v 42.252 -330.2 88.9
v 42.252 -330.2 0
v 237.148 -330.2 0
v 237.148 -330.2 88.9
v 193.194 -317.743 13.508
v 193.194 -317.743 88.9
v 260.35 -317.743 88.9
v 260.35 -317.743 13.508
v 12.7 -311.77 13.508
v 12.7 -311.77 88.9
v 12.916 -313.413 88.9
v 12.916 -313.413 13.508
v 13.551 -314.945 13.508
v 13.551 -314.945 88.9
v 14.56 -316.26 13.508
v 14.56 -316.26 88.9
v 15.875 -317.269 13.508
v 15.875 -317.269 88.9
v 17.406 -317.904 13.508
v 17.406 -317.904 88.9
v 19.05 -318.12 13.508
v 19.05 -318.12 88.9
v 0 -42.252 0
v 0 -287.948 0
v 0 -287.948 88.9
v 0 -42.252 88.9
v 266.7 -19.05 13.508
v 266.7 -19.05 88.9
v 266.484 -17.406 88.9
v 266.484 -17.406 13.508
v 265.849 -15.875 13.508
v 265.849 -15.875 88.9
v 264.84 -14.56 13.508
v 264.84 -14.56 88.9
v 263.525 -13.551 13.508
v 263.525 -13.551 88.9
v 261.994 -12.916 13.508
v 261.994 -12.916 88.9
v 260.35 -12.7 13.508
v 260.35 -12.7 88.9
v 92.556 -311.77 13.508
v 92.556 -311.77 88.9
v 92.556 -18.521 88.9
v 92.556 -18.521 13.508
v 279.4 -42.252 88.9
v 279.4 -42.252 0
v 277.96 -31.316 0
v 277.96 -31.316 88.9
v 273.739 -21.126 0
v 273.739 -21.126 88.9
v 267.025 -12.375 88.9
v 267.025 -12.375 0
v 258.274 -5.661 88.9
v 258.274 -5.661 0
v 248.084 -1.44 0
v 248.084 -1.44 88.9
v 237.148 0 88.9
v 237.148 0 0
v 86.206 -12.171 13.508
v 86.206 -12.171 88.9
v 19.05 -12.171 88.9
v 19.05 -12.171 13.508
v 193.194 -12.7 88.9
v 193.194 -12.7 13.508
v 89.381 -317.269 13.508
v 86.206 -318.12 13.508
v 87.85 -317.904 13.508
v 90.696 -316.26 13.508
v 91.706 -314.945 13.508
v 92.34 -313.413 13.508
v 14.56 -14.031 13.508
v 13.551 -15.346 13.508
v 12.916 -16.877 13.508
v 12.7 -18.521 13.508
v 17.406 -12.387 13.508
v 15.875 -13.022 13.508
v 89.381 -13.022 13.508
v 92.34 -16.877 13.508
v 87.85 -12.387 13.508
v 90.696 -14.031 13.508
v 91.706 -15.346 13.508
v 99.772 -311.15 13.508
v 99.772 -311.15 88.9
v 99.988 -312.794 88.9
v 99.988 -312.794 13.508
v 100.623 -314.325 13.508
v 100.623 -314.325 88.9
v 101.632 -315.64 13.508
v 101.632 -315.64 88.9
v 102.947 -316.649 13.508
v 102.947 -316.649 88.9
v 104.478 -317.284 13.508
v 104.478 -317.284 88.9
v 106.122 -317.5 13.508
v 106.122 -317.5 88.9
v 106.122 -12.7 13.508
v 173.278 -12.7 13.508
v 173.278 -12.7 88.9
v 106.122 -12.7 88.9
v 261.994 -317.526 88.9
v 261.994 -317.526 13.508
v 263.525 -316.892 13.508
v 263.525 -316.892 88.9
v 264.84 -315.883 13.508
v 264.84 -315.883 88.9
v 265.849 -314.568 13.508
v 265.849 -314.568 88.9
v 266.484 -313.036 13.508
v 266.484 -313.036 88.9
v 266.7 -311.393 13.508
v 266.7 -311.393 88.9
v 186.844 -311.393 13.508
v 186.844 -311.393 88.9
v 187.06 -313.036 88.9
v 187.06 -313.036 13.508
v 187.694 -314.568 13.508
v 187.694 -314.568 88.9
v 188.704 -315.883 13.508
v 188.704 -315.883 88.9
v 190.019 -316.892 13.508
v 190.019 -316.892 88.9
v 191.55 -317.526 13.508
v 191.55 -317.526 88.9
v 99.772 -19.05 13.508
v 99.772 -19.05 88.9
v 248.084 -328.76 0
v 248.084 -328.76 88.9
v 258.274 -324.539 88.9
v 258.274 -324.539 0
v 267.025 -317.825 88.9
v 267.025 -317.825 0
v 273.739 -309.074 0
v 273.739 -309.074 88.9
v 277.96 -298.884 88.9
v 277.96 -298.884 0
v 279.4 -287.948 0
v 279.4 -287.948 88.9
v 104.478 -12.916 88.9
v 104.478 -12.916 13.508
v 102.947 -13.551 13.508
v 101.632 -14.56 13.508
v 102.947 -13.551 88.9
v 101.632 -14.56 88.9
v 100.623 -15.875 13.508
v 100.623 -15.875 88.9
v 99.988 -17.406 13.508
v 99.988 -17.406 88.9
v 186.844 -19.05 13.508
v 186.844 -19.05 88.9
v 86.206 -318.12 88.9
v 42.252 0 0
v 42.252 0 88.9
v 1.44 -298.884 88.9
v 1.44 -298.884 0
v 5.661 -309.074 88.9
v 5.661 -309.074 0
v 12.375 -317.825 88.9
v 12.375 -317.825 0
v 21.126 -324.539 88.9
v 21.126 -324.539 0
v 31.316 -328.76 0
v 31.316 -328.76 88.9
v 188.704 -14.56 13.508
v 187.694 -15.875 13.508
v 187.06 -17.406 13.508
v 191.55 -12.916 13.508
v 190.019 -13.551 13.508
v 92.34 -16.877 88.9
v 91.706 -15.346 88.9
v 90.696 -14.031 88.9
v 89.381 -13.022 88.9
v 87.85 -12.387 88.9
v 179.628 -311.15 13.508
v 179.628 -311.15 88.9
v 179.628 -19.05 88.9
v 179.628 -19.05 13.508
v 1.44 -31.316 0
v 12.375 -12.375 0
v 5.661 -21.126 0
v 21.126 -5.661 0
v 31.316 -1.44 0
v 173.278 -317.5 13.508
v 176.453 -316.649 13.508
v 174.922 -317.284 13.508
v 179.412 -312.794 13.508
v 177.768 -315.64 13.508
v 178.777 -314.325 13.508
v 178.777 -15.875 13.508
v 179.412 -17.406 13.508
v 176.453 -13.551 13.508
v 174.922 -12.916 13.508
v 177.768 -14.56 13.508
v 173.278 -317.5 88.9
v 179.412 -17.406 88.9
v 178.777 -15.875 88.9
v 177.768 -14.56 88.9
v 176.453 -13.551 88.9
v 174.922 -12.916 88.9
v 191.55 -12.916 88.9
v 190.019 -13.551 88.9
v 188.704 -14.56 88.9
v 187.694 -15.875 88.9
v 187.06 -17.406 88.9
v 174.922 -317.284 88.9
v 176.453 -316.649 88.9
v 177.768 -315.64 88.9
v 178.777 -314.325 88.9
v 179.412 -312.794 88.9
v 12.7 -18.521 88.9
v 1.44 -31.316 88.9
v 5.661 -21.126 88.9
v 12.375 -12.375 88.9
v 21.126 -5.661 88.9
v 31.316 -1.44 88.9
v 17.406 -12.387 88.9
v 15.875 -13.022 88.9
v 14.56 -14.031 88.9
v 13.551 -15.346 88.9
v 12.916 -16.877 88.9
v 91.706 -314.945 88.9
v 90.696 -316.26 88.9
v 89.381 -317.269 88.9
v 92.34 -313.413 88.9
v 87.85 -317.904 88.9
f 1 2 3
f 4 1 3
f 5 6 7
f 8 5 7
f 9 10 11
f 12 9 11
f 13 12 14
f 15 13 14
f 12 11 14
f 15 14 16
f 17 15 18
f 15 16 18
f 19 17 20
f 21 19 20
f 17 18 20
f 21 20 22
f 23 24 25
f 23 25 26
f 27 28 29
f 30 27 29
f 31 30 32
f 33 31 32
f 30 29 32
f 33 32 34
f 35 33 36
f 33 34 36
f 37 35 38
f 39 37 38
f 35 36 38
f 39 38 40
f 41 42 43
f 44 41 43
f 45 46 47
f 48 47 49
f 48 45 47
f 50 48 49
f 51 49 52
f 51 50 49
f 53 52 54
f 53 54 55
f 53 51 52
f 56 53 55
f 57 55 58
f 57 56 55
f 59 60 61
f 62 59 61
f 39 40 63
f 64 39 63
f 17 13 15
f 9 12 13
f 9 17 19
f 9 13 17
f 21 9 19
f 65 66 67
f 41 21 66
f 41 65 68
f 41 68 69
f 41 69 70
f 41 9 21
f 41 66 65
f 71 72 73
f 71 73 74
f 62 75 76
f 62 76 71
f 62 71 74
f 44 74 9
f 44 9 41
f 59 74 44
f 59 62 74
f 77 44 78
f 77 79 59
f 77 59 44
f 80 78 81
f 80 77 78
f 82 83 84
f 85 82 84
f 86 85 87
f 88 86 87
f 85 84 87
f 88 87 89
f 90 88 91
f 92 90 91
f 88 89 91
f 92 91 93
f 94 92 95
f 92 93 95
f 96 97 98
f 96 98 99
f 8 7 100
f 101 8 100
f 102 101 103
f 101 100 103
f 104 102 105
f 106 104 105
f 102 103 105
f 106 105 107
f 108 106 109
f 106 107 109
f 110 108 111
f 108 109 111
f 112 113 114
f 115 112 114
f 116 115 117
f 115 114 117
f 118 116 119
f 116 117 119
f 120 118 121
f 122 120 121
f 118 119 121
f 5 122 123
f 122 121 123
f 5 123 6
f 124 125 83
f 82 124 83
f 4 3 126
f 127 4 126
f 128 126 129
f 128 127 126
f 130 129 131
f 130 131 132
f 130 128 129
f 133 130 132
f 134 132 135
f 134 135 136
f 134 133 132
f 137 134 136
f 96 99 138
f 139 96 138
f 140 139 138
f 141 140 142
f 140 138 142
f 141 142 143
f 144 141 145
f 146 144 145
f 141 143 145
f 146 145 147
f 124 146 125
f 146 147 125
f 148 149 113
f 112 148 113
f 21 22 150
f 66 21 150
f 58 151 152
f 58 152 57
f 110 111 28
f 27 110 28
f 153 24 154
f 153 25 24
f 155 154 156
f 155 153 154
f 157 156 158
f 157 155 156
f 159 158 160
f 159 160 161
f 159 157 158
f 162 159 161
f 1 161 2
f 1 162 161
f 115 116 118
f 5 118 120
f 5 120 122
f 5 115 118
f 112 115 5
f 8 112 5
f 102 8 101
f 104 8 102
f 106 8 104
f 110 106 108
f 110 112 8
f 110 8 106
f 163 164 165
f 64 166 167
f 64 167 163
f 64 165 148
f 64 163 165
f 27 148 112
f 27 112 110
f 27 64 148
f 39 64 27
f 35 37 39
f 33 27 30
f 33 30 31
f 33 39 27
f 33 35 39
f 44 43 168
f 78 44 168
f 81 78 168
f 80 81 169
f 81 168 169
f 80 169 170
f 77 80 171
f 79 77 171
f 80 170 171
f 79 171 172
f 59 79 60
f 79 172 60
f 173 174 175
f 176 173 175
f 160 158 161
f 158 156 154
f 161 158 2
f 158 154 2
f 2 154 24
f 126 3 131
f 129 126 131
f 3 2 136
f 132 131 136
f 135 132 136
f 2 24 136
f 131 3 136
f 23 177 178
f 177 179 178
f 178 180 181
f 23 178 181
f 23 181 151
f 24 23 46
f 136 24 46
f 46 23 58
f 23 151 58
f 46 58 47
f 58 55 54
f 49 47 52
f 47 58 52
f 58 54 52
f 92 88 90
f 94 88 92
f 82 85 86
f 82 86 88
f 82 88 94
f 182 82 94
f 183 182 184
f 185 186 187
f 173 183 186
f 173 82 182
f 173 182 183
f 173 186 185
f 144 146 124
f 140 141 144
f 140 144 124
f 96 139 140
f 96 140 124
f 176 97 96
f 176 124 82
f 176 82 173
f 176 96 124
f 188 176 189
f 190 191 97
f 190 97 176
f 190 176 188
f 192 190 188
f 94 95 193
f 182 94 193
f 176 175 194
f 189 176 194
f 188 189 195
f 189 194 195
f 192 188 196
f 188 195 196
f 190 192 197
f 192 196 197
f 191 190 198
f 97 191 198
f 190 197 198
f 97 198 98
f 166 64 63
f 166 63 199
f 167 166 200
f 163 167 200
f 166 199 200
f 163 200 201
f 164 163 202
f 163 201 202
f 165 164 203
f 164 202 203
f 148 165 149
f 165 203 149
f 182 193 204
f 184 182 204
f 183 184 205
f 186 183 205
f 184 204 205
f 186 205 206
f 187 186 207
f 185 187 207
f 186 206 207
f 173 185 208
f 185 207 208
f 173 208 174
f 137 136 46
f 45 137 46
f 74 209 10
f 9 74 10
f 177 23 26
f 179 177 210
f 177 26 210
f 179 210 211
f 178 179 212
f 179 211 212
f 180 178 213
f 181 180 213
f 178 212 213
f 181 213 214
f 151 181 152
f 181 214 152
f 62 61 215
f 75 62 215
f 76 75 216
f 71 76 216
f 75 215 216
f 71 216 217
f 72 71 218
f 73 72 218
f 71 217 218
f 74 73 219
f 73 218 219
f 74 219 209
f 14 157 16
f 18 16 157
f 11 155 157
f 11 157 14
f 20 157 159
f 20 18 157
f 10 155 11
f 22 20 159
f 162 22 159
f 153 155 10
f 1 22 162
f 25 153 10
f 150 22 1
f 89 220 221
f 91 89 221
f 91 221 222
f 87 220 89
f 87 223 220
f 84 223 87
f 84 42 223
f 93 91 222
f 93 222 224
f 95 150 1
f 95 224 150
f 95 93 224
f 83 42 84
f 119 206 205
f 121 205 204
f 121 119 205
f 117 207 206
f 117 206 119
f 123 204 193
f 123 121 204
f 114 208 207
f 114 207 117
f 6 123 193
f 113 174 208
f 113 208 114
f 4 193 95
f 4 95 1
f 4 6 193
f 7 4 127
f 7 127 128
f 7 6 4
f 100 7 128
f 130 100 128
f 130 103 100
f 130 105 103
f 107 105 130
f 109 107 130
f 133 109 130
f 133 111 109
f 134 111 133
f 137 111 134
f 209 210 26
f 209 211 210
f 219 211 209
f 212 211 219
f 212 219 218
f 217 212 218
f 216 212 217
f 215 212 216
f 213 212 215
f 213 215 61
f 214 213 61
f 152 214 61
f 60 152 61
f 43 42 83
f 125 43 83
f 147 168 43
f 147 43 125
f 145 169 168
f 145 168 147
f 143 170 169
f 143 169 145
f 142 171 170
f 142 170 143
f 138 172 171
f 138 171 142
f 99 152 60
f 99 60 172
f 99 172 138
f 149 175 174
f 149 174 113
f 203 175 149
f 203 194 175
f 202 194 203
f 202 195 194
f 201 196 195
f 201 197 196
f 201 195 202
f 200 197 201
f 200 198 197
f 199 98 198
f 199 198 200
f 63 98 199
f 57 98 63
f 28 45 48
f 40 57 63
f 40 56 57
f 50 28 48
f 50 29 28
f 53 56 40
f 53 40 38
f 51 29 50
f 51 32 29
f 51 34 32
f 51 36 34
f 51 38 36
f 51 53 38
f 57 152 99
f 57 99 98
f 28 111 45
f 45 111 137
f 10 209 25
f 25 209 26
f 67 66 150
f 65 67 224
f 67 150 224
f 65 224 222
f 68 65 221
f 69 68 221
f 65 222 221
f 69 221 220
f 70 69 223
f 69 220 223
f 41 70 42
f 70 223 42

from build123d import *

# Parameters (mm, degrees)
F0_W     = 279.4
F0_H     = 330.2
F1_DEPTH = 88.9
F2_R     = 42.251924
F4_DEPTH = 75.39211


with BuildPart() as f1:
    # F0 (on Top) → F1 (new body)
    with BuildSketch(Plane.XY):
        with Locations((139.7, -165.1)):
            Rectangle(F0_W, F0_H)
    extrude(amount=F1_DEPTH)

    # F2
    f2_edges = [f1.edges().sort_by_distance(p)[0] for p in [
        (0, -330.2, 44.45),
        (279.4, -330.2, 44.45),
        (279.4, 0, 44.45),
        (0, 0, 44.45),
    ]]
    fillet(f2_edges, radius=F2_R)

    # F3 (on face) → F4 (cut)
    with BuildSketch(Plane.XY.offset(88.9)):
        with BuildLine():
            ThreePointArc((99.771842, -311.15), (101.631714, -315.640128), (106.121842, -317.5))
            Line((106.121842, -317.5), (173.278158, -317.5))
            ThreePointArc((173.278158, -317.5), (177.768286, -315.640128), (179.628158, -311.15))
            Line((179.628158, -311.15), (179.628158, -19.05))
            ThreePointArc((179.628158, -19.05), (177.768286, -14.559872), (173.278158, -12.7))
            Line((173.278158, -12.7), (106.121842, -12.7))
            ThreePointArc((106.121842, -12.7), (101.631714, -14.559872), (99.771842, -19.05))
            Line((99.771842, -19.05), (99.771842, -311.15))
        make_face()
        with BuildLine():
            Line((260.35, -12.7), (193.193685, -12.7))
            ThreePointArc((193.193685, -12.7), (188.703557, -14.559872), (186.843685, -19.05))
            Line((186.843685, -19.05), (186.843685, -311.392798))
            ThreePointArc((186.843685, -311.392798), (188.703557, -315.882926), (193.193685, -317.742798))
            Line((193.193685, -317.742798), (260.35, -317.742798))
            ThreePointArc((260.35, -317.742798), (264.840128, -315.882926), (266.7, -311.392798))
            Line((266.7, -311.392798), (266.7, -19.05))
            ThreePointArc((266.7, -19.05), (264.840128, -14.559872), (260.35, -12.7))
        make_face()
        with BuildLine():
            Line((86.206315, -12.170881), (19.05, -12.170881))
            ThreePointArc((19.05, -12.170881), (14.559872, -14.030753), (12.7, -18.520881))
            Line((12.7, -18.520881), (12.7, -311.769943))
            ThreePointArc((12.7, -311.769943), (14.559872, -316.260071), (19.05, -318.119943))
            Line((19.05, -318.119943), (86.206315, -318.119943))
            ThreePointArc((86.206315, -318.119943), (90.696443, -316.260071), (92.556315, -311.769943))
            Line((92.556315, -311.769943), (92.556315, -18.520881))
            ThreePointArc((92.556315, -18.520881), (90.696443, -14.030753), (86.206315, -12.170881))
        make_face()
    extrude(amount=-F4_DEPTH, mode=Mode.SUBTRACT)


solid = f1.part
